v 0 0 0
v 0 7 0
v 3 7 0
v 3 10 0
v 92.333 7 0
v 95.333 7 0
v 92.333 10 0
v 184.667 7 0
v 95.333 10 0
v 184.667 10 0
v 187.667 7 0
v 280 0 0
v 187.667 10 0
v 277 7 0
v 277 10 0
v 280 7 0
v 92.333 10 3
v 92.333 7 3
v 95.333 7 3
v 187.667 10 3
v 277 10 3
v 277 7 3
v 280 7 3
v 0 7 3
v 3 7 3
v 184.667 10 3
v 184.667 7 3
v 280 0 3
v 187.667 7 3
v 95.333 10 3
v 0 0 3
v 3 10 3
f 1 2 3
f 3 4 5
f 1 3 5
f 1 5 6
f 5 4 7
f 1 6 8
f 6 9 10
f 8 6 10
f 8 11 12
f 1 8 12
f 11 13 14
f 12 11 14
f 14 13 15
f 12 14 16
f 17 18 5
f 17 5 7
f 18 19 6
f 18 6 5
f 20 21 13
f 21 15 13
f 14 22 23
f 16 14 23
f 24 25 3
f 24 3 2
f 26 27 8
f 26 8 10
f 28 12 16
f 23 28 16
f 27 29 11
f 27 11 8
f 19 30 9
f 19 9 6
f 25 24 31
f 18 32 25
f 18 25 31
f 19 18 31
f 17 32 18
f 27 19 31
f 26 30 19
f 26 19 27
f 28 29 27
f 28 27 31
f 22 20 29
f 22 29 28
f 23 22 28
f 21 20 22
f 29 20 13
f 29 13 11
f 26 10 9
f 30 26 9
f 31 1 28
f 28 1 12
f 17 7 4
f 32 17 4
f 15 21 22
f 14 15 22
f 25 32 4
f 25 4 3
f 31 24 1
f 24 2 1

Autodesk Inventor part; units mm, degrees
ref_plane "YZ Plane" through (0, 0, 0) normal (1, 0, 0) x (0, 1, 0)
ref_plane "XZ Plane" through (0, 0, 0) normal (0, 1, 0) x (-1, 0, 0)
ref_plane "XY Plane" through (0, 0, 0) normal (0, 0, 1) x (1, 0, 0)
sketch "草圖1" plane through (0, 0, 0) normal (0, 0, 1) x (1, 0, 0)
  line L0 (0, 0) -> (280, 0)
  line L1 (280, 0) -> (280, 10)
  line L2 (280, 10) -> (0, 10)
  line L3 (0, 10) -> (0, 0)
  dimension "d0" = 10
  dimension "d1" = 280
extrude "擠出1" add sketch "草圖1" along normal blind 3
sketch "草圖2" plane through (0, 0, 3) normal (0, 0, 1) x (1, 0, 0)
  line L0 (280, 0) -> (280, 10) projected
  line L1 (280, 10) -> (0, 10) projected
  line L2 (0, 10) -> (0, 0) projected
  line L3 (0, 0) -> (280, 0) projected
  line L4 (0, 10) -> (3, 10)
  line L5 (3, 10) -> (3, 7)
  line L6 (3, 7) -> (0, 7)
  line L7 (0, 7) -> (0, 10)
  line L8 (92.3333, 10) -> (95.3333, 10)
  line L9 (95.3333, 10) -> (95.3333, 7)
  line L10 (95.3333, 7) -> (92.3333, 7)
  line L11 (92.3333, 7) -> (92.3333, 10)
  line L12 (280, 10) -> (277, 10)
  line L13 (277, 10) -> (277, 7)
  line L14 (277, 7) -> (280, 7)
  line L15 (280, 7) -> (280, 10)
  line L16 (184.6667, 10) -> (187.6667, 10)
  line L17 (187.6667, 10) -> (187.6667, 7)
  line L18 (187.6667, 7) -> (184.6667, 7)
  line L19 (184.6667, 7) -> (184.6667, 10)
  point P0 (0, 7)
  dimension "d4" = 3
  dimension "d6" = 89.3333
  dimension "d7" = 89.3333
  dimension "d8" = 7
  dimension "d9" = 10
extrude "擠出2" cut sketch "草圖2" against normal through all contours L14 L13 L1 L0 | L2 L1 L5 L6 | L17 L18 L19 L1 | L1 L9 L10 L11
equation "\"d7\" = d6"
properties part number "支撐架"
